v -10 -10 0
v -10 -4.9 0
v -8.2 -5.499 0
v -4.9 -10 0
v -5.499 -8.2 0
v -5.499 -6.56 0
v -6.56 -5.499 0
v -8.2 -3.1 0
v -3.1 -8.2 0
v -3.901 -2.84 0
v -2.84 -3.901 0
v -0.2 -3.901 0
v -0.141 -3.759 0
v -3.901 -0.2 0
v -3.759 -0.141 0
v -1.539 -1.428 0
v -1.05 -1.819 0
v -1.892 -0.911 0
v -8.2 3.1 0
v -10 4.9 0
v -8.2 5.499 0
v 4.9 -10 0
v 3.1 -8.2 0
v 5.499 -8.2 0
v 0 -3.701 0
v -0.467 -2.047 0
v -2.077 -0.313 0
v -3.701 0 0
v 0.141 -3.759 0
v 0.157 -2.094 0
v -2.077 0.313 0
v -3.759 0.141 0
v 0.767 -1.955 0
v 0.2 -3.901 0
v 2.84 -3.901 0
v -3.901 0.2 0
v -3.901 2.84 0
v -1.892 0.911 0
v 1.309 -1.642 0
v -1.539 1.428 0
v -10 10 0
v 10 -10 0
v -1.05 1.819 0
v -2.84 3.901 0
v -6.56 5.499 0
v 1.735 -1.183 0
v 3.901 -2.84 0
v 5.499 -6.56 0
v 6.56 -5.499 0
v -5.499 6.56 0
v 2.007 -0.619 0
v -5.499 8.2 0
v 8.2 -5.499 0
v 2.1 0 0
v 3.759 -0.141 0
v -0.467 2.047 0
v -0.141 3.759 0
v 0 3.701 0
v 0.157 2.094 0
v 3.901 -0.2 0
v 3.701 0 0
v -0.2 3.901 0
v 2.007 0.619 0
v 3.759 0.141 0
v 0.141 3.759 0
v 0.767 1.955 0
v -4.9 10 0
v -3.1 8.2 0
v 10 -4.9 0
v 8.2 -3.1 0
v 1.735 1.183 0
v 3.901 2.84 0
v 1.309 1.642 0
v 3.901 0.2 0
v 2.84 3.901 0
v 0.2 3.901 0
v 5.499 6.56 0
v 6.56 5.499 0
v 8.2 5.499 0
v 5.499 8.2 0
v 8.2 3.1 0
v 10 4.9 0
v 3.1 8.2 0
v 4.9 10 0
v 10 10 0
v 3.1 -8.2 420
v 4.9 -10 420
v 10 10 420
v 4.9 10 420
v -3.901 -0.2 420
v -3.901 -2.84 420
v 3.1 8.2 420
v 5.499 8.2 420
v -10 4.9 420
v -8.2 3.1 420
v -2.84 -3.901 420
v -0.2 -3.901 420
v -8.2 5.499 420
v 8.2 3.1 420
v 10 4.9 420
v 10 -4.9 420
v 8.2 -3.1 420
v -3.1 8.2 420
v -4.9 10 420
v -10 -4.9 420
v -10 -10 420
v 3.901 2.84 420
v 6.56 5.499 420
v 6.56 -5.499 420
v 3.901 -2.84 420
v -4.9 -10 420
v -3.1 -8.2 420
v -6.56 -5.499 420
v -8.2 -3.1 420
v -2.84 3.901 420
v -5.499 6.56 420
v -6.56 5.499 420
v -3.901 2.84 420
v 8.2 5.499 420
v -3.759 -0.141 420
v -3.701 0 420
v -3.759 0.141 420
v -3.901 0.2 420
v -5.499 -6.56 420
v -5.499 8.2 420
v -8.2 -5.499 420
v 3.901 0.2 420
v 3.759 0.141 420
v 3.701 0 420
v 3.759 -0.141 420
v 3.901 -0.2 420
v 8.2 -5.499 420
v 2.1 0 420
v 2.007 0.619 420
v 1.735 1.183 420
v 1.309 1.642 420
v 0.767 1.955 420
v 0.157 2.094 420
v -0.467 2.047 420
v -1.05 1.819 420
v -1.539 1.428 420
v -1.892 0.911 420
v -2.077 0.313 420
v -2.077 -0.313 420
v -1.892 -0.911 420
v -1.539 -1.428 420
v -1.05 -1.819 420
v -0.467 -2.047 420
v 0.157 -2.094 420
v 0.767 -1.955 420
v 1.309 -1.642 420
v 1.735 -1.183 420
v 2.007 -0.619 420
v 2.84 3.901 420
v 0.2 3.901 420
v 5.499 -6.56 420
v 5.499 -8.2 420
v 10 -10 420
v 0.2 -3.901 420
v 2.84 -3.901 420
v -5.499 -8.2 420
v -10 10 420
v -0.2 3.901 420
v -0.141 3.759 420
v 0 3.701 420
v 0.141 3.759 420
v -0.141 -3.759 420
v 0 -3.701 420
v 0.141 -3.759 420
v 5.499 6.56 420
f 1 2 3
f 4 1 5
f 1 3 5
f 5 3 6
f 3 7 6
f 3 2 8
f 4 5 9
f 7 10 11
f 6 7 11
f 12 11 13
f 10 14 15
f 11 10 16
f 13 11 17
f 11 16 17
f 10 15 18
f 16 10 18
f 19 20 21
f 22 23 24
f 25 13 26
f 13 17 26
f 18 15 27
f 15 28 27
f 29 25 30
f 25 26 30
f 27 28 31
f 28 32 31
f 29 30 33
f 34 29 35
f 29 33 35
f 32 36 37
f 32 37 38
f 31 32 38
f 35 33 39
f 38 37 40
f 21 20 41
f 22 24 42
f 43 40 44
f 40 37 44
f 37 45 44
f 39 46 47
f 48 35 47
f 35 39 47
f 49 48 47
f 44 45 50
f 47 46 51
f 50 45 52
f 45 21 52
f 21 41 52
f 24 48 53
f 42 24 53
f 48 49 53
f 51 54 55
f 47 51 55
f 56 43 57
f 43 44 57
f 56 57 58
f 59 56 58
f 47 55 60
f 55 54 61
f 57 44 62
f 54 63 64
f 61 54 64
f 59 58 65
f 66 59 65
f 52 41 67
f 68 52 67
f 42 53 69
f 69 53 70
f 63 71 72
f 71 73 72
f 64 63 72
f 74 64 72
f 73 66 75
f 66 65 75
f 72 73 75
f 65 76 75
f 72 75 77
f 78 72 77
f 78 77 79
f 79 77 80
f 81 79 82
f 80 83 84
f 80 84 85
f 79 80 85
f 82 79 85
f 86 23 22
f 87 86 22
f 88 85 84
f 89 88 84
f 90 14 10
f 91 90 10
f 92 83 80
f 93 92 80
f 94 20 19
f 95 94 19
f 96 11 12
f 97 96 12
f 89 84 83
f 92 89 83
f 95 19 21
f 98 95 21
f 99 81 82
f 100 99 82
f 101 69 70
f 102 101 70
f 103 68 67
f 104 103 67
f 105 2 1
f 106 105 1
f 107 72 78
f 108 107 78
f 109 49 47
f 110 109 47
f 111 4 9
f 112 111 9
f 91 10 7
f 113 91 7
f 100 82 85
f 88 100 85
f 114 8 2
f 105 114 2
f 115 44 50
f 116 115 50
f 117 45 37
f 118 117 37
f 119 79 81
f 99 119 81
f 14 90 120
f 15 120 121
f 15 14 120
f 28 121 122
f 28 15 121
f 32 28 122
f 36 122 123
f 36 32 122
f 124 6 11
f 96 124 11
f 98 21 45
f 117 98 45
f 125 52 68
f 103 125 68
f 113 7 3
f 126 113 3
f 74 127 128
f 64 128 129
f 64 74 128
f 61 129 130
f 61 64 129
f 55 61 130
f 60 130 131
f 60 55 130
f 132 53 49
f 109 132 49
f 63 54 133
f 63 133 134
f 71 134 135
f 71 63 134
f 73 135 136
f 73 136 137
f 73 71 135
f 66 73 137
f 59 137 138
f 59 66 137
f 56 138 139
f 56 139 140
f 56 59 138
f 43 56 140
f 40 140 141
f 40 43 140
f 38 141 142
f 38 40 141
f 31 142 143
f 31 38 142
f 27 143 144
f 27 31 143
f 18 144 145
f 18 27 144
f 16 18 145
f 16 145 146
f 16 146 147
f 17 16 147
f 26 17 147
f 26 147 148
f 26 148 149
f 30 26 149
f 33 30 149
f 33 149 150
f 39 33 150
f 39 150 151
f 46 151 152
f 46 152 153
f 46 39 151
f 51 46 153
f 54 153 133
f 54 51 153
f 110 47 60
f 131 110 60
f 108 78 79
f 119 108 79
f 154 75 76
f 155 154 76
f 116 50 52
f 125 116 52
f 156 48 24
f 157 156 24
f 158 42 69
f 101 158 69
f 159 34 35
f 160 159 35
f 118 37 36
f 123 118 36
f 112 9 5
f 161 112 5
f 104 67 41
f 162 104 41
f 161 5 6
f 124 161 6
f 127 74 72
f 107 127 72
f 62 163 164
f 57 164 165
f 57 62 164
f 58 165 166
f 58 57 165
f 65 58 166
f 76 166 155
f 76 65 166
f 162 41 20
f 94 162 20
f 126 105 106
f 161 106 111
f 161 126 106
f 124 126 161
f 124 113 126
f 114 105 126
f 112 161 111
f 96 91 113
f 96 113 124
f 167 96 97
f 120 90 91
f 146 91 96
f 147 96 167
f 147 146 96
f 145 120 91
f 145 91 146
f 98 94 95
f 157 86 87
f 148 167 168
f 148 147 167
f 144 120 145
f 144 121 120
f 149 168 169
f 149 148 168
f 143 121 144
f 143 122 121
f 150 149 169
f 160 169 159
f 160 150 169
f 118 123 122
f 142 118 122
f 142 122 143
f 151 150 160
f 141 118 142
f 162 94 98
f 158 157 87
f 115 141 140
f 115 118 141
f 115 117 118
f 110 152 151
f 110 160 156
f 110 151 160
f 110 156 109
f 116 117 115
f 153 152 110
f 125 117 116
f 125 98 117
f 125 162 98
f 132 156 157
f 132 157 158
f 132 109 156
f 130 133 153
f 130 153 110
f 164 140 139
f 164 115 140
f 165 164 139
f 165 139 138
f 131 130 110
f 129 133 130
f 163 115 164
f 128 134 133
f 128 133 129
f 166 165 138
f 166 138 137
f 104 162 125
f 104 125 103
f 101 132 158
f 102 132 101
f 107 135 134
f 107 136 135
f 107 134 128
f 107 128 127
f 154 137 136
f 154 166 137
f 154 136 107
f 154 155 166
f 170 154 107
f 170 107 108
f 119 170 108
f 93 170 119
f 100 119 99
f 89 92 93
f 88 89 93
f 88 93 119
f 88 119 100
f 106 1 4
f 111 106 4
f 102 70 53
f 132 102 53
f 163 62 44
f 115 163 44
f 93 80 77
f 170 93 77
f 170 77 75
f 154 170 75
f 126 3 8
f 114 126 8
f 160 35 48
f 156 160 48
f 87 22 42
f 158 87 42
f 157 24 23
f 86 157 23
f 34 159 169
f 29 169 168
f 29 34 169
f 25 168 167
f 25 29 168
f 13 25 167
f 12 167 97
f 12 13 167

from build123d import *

# Parameters (mm, degrees)
SKETCH1_R           = 2.1
BOSS_EXTRUDE1_DEPTH = 420
CUT_EXTRUDE1_DEPTH  = 420


# Read off the part's stored shape, not the designer's step: Cut-Extrude1
with BuildPart() as part:
    # Sketch1 → Boss-Extrude1 (new body)
    with BuildSketch(Plane.XY):
        Polygon((-10, -4.9), (-10, -10), (-4.9, -10), (-3.1, -8.2), (-5.499339828, -8.2), (-5.499339828, -6.56), (-2.84, -3.900660172), (2.84, -3.900660172), (5.499339828, -6.56), (5.499339828, -8.2), (3.1, -8.2), (4.9, -10), (10, -10), (10, -4.9), (8.2, -3.1), (8.2, -5.499339828), (6.56, -5.499339828), (3.900660172, -2.84), (3.900660172, 2.84), (6.56, 5.499339828), (8.2, 5.499339828), (8.2, 3.1), (10, 4.9), (10, 10), (4.9, 10), (3.1, 8.2), (5.499339828, 8.2), (5.499339828, 6.56), (2.84, 3.900660172), (-2.84, 3.900660172), (-5.499339828, 6.56), (-5.499339828, 8.2), (-3.1, 8.2), (-4.9, 10), (-10, 10), (-10, 4.9), (-8.2, 3.1), (-8.2, 5.499339828), (-6.56, 5.499339828), (-3.900660172, 2.84), (-3.900660172, -2.84), (-6.56, -5.499339828), (-8.2, -5.499339828), (-8.2, -3.1), align=None)
        Circle(SKETCH1_R, mode=Mode.SUBTRACT)
    extrude(amount=BOSS_EXTRUDE1_DEPTH)

    # Cut-Extrude1 outline → Cut-Extrude1 (cut)
    with BuildSketch(Plane.XY):
        with BuildLine():
            Line((-3.900660172, 0.2), (-3.900660172, -0.2))
            ThreePointArc((-3.900660172, -0.2), (-3.700660172, 0), (-3.900660172, 0.2))
        make_face()
        with BuildLine():
            Line((0.2, 3.900660172), (-0.2, 3.900660172))
            ThreePointArc((-0.2, 3.900660172), (0, 3.700660172), (0.2, 3.900660172))
        make_face()
        with BuildLine():
            Line((3.900660172, -0.2), (3.900660172, 0.2))
            ThreePointArc((3.900660172, 0.2), (3.700660172, 0), (3.900660172, -0.2))
        make_face()
        with BuildLine():
            Line((-0.2, -3.900660172), (0.2, -3.900660172))
            ThreePointArc((0.2, -3.900660172), (0, -3.700660172), (-0.2, -3.900660172))
        make_face()
    extrude(amount=CUT_EXTRUDE1_DEPTH, mode=Mode.SUBTRACT)


solid = part.part
